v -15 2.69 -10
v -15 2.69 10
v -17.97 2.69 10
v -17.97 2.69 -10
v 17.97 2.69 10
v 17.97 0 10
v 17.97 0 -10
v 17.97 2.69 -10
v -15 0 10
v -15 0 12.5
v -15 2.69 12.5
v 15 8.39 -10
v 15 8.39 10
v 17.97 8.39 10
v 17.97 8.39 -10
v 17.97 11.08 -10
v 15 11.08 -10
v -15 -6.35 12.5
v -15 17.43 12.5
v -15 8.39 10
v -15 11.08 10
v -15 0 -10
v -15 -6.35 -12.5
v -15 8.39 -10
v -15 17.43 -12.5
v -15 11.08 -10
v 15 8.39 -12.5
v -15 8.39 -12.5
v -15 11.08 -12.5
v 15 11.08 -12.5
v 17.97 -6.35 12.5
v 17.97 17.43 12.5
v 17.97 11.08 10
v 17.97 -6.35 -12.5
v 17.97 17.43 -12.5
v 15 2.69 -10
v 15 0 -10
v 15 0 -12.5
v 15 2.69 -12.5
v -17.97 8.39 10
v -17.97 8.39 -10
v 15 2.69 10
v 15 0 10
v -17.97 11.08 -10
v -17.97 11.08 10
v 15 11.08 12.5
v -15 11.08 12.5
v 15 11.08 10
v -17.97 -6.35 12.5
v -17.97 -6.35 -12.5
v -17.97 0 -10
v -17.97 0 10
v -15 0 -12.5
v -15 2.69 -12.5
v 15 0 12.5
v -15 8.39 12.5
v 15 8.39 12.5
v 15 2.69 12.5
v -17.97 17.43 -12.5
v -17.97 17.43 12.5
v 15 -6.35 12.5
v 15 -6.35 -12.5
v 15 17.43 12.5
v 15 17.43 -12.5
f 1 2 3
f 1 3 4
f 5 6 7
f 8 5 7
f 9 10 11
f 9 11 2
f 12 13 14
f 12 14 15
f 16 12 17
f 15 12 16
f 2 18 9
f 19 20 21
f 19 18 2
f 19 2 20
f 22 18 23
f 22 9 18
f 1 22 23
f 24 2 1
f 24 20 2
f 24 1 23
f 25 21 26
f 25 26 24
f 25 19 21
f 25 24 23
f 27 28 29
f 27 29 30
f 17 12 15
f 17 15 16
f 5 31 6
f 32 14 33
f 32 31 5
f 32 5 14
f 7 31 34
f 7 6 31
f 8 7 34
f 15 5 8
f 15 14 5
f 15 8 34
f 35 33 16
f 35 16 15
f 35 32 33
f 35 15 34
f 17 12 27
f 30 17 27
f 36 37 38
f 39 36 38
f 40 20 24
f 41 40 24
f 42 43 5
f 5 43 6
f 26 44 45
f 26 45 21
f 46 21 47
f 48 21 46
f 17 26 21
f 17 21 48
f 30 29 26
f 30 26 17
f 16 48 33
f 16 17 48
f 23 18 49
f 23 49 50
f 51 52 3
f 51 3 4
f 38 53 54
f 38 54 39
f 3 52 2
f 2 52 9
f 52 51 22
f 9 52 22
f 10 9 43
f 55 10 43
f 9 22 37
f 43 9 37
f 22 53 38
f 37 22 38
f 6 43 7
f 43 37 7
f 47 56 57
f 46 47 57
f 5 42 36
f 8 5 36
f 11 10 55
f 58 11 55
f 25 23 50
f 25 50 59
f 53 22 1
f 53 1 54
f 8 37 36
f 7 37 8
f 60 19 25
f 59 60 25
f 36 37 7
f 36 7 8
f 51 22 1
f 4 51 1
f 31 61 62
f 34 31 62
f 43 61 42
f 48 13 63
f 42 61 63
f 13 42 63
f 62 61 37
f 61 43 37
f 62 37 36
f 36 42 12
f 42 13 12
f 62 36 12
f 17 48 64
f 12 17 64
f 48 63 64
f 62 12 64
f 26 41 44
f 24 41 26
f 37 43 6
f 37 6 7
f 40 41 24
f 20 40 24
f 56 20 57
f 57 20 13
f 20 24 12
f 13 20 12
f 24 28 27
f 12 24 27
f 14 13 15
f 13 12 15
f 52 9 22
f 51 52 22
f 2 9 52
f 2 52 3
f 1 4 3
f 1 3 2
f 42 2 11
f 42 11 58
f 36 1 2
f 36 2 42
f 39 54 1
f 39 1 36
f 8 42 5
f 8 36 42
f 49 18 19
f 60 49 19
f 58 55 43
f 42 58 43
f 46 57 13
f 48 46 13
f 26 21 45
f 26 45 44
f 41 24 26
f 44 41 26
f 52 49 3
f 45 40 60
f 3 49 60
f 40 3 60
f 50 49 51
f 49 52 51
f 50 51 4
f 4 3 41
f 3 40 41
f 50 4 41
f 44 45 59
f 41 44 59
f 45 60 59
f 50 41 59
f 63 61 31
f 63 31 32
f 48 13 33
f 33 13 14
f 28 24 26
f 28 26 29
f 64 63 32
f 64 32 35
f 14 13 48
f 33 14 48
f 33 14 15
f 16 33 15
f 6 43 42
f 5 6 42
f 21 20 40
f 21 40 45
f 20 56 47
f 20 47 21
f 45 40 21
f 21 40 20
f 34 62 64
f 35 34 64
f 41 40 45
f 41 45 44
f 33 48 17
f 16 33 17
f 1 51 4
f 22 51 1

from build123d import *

# Parameters (mm, degrees)
SKETCH2_W           = 30
SKETCH2_H           = 25
SKETCH2_W_2         = 2.97
SKETCH2_H_2         = 20
BOSS_EXTRUDE3_DEPTH = 2.69
BOSS_EXTRUDE4_START = 8.39
SKETCH2_3_W         = 2.97
SKETCH2_3_H         = 20
SKETCH2_3_W_2       = 30
SKETCH2_3_H_2       = 25
BOSS_EXTRUDE4_DEPTH = 2.69
SKETCH4_W           = 25
SKETCH4_H           = 23.78
SKETCH4_W_2         = 20
SKETCH4_H_2         = 2.69
BOSS_EXTRUDE5_DEPTH = 2.97


with BuildPart() as part:
    # Sketch2 → Boss-Extrude3 (new body)
    with BuildSketch(Plane(origin=(0, 0, 0), x_dir=(1, 0, 0), z_dir=(0, 1, 0))):
        Rectangle(SKETCH2_W, SKETCH2_H)
        with Locations((-16.485, 0)):
            Rectangle(SKETCH2_W_2, SKETCH2_H_2)
        with Locations((16.485, 0)):
            Rectangle(SKETCH2_W_2, SKETCH2_H_2)
    extrude(amount=BOSS_EXTRUDE3_DEPTH)


with BuildPart() as body_2:
    # Sketch2<3> → Boss-Extrude4 (new body)
    with BuildSketch(Plane(origin=(0, 0, 0), x_dir=(1, 0, 0), z_dir=(0, 1, 0)).offset(BOSS_EXTRUDE4_START)):
        with Locations((-16.485, 0)):
            Rectangle(SKETCH2_3_W, SKETCH2_3_H)
        Rectangle(SKETCH2_3_W_2, SKETCH2_3_H_2)
        with Locations((16.485, 0)):
            Rectangle(SKETCH2_3_W, SKETCH2_3_H)
    extrude(amount=BOSS_EXTRUDE4_DEPTH)


with BuildPart() as body_3:
    # Sketch4 → Boss-Extrude5 (new body)
    with BuildSketch(Plane(origin=(15, 0, 0), x_dir=(0, 0, -1), z_dir=(1, 0, 0))):
        with Locations((0, 5.54)):
            Rectangle(SKETCH4_W, SKETCH4_H)
        with Locations((0, 9.735)):
            Rectangle(SKETCH4_W_2, SKETCH4_H_2, mode=Mode.SUBTRACT)
        with Locations((0, 1.345)):
            Rectangle(SKETCH4_W_2, SKETCH4_H_2, mode=Mode.SUBTRACT)
    extrude(amount=BOSS_EXTRUDE5_DEPTH)


with BuildPart() as body_4:
    # Mirror1: mirrored copy
    add(body_3.part.mirror(Plane(origin=(0, 0, 0), x_dir=(0, 0, 1), z_dir=(1, 0, 0))))


solid = Compound([part.part, body_2.part, body_3.part, body_4.part])
